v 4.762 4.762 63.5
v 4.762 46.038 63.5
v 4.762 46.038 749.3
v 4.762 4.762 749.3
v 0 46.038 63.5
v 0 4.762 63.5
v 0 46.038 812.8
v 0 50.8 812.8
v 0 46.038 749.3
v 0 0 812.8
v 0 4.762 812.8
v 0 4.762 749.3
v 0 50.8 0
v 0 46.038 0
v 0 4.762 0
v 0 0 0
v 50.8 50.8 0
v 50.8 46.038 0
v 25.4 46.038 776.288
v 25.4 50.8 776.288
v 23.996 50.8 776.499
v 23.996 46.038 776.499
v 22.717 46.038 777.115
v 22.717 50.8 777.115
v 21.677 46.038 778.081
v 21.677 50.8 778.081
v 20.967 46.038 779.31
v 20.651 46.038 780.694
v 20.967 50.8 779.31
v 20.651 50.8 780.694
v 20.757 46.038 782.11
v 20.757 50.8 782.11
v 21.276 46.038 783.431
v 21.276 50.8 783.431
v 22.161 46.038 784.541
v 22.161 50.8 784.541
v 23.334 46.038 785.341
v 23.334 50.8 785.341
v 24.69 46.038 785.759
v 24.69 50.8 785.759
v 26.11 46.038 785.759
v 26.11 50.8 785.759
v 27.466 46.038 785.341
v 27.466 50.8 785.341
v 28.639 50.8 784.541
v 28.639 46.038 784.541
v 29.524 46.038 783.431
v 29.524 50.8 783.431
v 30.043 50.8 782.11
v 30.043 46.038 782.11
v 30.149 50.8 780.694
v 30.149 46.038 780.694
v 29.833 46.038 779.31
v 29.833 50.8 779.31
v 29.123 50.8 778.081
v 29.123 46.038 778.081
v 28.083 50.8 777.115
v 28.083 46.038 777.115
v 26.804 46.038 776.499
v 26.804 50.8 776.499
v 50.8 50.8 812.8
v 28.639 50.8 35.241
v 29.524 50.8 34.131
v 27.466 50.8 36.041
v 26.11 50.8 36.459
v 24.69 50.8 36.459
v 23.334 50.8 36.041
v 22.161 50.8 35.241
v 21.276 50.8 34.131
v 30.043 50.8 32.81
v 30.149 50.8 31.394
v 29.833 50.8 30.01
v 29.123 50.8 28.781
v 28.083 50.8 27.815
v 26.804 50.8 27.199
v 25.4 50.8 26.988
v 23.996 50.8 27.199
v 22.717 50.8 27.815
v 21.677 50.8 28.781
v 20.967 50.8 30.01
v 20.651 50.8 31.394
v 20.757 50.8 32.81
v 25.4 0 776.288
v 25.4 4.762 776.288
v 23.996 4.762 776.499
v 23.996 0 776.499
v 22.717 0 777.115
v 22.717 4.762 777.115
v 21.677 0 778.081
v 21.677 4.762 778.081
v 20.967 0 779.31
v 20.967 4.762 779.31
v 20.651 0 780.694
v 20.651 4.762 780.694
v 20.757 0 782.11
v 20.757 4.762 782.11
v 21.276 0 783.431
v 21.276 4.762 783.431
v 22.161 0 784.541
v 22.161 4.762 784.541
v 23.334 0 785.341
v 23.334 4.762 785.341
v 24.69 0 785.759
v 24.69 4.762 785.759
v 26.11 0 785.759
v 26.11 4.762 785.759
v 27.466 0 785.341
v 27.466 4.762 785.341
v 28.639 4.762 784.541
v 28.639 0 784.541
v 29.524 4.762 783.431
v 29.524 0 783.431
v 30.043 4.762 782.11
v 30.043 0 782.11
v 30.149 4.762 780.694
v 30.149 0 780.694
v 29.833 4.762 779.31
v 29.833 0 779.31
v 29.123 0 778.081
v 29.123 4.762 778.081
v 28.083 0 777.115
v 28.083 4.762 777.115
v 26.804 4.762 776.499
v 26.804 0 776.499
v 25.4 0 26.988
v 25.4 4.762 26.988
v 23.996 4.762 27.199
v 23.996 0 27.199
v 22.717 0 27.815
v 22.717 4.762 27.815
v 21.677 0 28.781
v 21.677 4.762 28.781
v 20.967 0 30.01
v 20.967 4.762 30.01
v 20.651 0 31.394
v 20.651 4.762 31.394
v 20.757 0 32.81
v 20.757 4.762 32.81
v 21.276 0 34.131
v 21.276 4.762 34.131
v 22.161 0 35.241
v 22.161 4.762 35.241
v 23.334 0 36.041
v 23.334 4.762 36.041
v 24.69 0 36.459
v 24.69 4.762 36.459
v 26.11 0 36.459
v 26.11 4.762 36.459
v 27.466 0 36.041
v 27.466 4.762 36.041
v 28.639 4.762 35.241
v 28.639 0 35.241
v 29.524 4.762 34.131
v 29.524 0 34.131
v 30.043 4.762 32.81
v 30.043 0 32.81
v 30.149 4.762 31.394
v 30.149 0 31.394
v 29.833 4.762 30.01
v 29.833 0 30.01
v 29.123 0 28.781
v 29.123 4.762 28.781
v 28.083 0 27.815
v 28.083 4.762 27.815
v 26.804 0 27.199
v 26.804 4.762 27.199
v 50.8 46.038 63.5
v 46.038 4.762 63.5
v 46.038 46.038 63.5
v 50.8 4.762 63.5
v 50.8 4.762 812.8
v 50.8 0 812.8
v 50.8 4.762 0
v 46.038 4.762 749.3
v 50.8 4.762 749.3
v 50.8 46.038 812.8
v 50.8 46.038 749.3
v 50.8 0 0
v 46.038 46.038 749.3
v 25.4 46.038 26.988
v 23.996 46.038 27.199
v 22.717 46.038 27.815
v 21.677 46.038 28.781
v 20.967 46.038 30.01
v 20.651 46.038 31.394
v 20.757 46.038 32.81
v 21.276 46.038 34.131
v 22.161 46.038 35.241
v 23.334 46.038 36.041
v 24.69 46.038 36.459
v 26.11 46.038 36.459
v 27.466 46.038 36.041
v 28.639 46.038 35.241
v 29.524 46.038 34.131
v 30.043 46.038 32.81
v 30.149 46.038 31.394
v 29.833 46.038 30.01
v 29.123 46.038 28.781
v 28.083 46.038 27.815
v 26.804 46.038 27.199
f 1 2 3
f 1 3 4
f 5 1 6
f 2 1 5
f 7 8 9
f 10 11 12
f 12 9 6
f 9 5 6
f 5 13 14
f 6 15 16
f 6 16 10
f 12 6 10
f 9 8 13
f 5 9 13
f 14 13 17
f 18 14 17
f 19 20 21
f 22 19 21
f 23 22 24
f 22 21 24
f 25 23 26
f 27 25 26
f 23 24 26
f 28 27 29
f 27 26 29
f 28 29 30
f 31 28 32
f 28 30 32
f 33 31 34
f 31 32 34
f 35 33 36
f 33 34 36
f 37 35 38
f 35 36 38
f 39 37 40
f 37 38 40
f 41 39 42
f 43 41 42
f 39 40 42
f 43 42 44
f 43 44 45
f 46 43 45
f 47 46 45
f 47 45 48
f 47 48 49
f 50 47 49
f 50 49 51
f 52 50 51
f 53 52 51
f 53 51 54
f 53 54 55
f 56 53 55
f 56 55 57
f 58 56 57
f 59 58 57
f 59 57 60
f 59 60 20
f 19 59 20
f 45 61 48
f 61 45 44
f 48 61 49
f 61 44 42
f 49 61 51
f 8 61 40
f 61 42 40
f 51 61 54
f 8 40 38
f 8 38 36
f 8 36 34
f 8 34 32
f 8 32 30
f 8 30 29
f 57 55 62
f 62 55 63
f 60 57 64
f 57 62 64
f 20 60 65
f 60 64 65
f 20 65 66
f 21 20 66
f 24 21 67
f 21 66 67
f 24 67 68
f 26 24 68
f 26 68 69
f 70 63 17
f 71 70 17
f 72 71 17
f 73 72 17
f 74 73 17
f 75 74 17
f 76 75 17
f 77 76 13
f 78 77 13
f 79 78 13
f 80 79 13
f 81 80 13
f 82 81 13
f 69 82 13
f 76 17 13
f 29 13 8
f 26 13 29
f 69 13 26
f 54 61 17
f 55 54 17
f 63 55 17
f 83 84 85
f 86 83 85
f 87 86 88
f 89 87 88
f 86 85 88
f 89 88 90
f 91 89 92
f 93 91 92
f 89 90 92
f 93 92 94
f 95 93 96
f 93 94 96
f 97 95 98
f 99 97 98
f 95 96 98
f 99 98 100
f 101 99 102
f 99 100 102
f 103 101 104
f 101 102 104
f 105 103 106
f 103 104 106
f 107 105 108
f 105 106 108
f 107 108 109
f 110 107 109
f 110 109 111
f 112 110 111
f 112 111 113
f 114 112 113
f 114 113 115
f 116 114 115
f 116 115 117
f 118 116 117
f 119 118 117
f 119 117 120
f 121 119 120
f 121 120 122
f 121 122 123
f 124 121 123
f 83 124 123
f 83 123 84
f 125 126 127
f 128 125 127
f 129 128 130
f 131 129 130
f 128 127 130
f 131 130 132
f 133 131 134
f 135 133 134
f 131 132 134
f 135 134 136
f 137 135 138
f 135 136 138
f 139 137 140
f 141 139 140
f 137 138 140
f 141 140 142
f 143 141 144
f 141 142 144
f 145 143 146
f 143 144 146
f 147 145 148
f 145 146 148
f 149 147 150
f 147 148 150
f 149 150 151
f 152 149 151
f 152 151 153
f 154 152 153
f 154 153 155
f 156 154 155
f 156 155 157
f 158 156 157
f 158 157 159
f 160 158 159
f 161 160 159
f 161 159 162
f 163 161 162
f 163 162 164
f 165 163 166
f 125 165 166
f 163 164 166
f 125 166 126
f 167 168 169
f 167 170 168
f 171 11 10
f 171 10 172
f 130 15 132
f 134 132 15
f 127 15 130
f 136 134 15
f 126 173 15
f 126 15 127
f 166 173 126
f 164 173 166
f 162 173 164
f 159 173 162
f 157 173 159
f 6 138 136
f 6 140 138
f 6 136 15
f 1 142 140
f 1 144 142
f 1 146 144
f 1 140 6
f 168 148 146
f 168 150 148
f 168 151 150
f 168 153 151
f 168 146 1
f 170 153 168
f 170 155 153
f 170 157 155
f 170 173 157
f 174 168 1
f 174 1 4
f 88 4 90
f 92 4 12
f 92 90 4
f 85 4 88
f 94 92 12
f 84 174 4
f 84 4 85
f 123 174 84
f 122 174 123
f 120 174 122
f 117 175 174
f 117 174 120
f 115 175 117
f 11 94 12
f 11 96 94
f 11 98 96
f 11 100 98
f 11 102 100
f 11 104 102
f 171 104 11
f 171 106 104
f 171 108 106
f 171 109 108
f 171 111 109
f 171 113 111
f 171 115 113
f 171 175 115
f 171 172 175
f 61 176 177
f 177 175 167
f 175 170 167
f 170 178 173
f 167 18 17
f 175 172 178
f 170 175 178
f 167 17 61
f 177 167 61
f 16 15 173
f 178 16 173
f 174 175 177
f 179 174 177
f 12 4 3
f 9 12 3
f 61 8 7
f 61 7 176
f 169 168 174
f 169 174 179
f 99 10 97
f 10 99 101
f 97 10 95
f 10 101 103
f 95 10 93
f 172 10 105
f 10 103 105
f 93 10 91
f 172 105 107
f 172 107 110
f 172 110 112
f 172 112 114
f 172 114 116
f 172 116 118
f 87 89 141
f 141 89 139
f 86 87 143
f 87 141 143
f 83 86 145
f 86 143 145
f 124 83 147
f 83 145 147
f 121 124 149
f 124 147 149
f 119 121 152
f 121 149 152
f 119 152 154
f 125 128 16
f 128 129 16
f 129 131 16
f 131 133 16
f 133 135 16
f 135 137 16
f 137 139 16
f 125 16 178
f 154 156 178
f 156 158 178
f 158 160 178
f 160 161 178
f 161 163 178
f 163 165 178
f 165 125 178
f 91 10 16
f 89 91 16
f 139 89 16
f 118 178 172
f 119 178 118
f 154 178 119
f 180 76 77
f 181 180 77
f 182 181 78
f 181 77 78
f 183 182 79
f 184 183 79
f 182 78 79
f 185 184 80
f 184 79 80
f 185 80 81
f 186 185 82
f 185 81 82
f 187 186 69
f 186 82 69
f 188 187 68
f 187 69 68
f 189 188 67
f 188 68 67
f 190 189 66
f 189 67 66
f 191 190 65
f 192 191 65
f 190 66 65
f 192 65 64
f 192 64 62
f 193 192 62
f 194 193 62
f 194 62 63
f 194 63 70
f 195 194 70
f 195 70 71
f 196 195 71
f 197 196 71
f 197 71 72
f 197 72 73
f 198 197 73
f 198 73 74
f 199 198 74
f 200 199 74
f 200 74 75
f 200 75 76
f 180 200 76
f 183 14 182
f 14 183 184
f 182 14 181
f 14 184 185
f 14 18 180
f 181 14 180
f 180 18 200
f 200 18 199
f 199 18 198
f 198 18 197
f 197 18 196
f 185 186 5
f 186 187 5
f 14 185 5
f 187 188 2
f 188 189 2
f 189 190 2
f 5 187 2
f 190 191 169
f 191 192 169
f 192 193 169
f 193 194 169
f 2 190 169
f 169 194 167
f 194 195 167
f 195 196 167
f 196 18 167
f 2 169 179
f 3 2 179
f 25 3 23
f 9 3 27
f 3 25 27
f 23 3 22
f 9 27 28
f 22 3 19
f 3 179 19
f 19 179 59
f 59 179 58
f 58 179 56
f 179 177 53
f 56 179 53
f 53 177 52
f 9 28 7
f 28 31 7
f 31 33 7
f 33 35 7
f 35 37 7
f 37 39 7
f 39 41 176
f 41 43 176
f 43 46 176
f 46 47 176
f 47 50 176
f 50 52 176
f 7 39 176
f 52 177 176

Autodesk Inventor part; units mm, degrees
ref_plane "YZ Plane" through (0, 0, 0) normal (1, 0, 0) x (0, 1, 0)
ref_plane "XZ Plane" through (0, 0, 0) normal (0, 1, 0) x (-1, 0, 0)
ref_plane "XY Plane" through (0, 0, 0) normal (0, 0, 1) x (1, 0, 0)
sketch "Sketch1" plane through (0, 0, 0) normal (0, 0, 1) x (1, 0, 0)
  line L0 (0, 0) -> (50.8, 0)
  line L1 (50.8, 0) -> (50.8, 50.8)
  line L2 (50.8, 50.8) -> (0, 50.8)
  line L3 (0, 50.8) -> (0, 0)
  line L4 (0, 0) -> (4.7625, 0) construction
  line L5 (4.7625, 0) -> (4.7625, 4.7625) construction
  line L6 (4.7625, 4.7625) -> (0, 4.7625) construction
  line L7 (0, 4.7625) -> (0, 0) construction
  line L8 (50.8, 50.8) -> (46.0375, 50.8) construction
  line L9 (46.0375, 50.8) -> (46.0375, 46.0375) construction
  line L10 (46.0375, 46.0375) -> (50.8, 46.0375) construction
  line L11 (50.8, 46.0375) -> (50.8, 50.8) construction
  line L12 (46.0375, 46.0375) -> (4.7625, 46.0375)
  line L13 (4.7625, 46.0375) -> (4.7625, 4.7625)
  line L14 (4.7625, 4.7625) -> (46.0375, 4.7625)
  line L15 (46.0375, 4.7625) -> (46.0375, 46.0375)
  dimension "d0" = 50.8
  dimension "d1" = 50.8
  dimension "d2" = 4.7625
  dimension "d3" = 4.7625
  dimension "d4" = 4.7625
  dimension "d5" = 4.7625
extrude "Extrusion1" add sketch "Sketch1" along normal blind 812.8
sketch "Sketch2" plane through (50.8, 0, 0) normal (1, 0, 0) x (0, 0, -1)
  line L0 (0, 4.7625) -> (-812.8, 4.7625) projected
  line L1 (0, 46.0375) -> (-812.8, 46.0375) projected
  line L2 (0, 4.7625) -> (-63.5, 4.7625)
  line L3 (-63.5, 4.7625) -> (-63.5, 46.0375)
  line L4 (-63.5, 46.0375) -> (0, 46.0375)
  line L5 (0, 46.0375) -> (0, 4.7625)
  line L6 (-812.8, 4.7625) -> (-812.8, 46.0375) projected
  line L7 (-812.8, 4.7625) -> (-749.3, 4.7625)
  line L8 (-749.3, 4.7625) -> (-749.3, 46.0375)
  line L9 (-749.3, 46.0375) -> (-812.8, 46.0375)
  line L10 (-812.8, 46.0375) -> (-812.8, 4.7625)
  point P0 (0, 0)
  dimension "d8" = 63.5
  dimension "d9" = 63.5
extrude "Extrusion2" cut sketch "Sketch2" against normal blind 50.8 contours L0 L3 L1 L5 | L0 L6 L1 L8
sketch "Sketch3" plane through (0, 0, 0) normal (0, -1, 0) x (1, 0, 0)
  line L0 (46.0375, 63.5) -> (46.0375, 749.3) projected
  line L1 (4.7625, 63.5) -> (0, 63.5) projected
  line L2 (46.0375, 63.5) -> (4.7625, 63.5)
  line L3 (25.4, 63.5) -> (25.4, 0)
  line L4 (50.8, 749.3) -> (46.0375, 749.3) projected
  line L5 (4.7625, 749.3) -> (0, 749.3) projected
  line L6 (46.0375, 749.3) -> (4.7625, 749.3)
  line L7 (25.4, 749.3) -> (25.4, 812.8)
  line L8 (0, 812.8) -> (50.8, 812.8) projected
  point P0 (0, 0)
  point P1 (25.4, 31.75)
  point P2 (25.4, 781.05)
hole "Hole1" at (25.4, 0, 31.75) at (25.4, 0, 781.05) direction (0, 1, 0) diameter 9.525 depth 50.8 tip angle 118
equation "\"d0\" = d1"
equation "\"d2\" = d3"
equation "\"d4\" = d3"
equation "\"d5\" = d3"
properties part number "32in2.0Sq" material "Steel, Mild"
